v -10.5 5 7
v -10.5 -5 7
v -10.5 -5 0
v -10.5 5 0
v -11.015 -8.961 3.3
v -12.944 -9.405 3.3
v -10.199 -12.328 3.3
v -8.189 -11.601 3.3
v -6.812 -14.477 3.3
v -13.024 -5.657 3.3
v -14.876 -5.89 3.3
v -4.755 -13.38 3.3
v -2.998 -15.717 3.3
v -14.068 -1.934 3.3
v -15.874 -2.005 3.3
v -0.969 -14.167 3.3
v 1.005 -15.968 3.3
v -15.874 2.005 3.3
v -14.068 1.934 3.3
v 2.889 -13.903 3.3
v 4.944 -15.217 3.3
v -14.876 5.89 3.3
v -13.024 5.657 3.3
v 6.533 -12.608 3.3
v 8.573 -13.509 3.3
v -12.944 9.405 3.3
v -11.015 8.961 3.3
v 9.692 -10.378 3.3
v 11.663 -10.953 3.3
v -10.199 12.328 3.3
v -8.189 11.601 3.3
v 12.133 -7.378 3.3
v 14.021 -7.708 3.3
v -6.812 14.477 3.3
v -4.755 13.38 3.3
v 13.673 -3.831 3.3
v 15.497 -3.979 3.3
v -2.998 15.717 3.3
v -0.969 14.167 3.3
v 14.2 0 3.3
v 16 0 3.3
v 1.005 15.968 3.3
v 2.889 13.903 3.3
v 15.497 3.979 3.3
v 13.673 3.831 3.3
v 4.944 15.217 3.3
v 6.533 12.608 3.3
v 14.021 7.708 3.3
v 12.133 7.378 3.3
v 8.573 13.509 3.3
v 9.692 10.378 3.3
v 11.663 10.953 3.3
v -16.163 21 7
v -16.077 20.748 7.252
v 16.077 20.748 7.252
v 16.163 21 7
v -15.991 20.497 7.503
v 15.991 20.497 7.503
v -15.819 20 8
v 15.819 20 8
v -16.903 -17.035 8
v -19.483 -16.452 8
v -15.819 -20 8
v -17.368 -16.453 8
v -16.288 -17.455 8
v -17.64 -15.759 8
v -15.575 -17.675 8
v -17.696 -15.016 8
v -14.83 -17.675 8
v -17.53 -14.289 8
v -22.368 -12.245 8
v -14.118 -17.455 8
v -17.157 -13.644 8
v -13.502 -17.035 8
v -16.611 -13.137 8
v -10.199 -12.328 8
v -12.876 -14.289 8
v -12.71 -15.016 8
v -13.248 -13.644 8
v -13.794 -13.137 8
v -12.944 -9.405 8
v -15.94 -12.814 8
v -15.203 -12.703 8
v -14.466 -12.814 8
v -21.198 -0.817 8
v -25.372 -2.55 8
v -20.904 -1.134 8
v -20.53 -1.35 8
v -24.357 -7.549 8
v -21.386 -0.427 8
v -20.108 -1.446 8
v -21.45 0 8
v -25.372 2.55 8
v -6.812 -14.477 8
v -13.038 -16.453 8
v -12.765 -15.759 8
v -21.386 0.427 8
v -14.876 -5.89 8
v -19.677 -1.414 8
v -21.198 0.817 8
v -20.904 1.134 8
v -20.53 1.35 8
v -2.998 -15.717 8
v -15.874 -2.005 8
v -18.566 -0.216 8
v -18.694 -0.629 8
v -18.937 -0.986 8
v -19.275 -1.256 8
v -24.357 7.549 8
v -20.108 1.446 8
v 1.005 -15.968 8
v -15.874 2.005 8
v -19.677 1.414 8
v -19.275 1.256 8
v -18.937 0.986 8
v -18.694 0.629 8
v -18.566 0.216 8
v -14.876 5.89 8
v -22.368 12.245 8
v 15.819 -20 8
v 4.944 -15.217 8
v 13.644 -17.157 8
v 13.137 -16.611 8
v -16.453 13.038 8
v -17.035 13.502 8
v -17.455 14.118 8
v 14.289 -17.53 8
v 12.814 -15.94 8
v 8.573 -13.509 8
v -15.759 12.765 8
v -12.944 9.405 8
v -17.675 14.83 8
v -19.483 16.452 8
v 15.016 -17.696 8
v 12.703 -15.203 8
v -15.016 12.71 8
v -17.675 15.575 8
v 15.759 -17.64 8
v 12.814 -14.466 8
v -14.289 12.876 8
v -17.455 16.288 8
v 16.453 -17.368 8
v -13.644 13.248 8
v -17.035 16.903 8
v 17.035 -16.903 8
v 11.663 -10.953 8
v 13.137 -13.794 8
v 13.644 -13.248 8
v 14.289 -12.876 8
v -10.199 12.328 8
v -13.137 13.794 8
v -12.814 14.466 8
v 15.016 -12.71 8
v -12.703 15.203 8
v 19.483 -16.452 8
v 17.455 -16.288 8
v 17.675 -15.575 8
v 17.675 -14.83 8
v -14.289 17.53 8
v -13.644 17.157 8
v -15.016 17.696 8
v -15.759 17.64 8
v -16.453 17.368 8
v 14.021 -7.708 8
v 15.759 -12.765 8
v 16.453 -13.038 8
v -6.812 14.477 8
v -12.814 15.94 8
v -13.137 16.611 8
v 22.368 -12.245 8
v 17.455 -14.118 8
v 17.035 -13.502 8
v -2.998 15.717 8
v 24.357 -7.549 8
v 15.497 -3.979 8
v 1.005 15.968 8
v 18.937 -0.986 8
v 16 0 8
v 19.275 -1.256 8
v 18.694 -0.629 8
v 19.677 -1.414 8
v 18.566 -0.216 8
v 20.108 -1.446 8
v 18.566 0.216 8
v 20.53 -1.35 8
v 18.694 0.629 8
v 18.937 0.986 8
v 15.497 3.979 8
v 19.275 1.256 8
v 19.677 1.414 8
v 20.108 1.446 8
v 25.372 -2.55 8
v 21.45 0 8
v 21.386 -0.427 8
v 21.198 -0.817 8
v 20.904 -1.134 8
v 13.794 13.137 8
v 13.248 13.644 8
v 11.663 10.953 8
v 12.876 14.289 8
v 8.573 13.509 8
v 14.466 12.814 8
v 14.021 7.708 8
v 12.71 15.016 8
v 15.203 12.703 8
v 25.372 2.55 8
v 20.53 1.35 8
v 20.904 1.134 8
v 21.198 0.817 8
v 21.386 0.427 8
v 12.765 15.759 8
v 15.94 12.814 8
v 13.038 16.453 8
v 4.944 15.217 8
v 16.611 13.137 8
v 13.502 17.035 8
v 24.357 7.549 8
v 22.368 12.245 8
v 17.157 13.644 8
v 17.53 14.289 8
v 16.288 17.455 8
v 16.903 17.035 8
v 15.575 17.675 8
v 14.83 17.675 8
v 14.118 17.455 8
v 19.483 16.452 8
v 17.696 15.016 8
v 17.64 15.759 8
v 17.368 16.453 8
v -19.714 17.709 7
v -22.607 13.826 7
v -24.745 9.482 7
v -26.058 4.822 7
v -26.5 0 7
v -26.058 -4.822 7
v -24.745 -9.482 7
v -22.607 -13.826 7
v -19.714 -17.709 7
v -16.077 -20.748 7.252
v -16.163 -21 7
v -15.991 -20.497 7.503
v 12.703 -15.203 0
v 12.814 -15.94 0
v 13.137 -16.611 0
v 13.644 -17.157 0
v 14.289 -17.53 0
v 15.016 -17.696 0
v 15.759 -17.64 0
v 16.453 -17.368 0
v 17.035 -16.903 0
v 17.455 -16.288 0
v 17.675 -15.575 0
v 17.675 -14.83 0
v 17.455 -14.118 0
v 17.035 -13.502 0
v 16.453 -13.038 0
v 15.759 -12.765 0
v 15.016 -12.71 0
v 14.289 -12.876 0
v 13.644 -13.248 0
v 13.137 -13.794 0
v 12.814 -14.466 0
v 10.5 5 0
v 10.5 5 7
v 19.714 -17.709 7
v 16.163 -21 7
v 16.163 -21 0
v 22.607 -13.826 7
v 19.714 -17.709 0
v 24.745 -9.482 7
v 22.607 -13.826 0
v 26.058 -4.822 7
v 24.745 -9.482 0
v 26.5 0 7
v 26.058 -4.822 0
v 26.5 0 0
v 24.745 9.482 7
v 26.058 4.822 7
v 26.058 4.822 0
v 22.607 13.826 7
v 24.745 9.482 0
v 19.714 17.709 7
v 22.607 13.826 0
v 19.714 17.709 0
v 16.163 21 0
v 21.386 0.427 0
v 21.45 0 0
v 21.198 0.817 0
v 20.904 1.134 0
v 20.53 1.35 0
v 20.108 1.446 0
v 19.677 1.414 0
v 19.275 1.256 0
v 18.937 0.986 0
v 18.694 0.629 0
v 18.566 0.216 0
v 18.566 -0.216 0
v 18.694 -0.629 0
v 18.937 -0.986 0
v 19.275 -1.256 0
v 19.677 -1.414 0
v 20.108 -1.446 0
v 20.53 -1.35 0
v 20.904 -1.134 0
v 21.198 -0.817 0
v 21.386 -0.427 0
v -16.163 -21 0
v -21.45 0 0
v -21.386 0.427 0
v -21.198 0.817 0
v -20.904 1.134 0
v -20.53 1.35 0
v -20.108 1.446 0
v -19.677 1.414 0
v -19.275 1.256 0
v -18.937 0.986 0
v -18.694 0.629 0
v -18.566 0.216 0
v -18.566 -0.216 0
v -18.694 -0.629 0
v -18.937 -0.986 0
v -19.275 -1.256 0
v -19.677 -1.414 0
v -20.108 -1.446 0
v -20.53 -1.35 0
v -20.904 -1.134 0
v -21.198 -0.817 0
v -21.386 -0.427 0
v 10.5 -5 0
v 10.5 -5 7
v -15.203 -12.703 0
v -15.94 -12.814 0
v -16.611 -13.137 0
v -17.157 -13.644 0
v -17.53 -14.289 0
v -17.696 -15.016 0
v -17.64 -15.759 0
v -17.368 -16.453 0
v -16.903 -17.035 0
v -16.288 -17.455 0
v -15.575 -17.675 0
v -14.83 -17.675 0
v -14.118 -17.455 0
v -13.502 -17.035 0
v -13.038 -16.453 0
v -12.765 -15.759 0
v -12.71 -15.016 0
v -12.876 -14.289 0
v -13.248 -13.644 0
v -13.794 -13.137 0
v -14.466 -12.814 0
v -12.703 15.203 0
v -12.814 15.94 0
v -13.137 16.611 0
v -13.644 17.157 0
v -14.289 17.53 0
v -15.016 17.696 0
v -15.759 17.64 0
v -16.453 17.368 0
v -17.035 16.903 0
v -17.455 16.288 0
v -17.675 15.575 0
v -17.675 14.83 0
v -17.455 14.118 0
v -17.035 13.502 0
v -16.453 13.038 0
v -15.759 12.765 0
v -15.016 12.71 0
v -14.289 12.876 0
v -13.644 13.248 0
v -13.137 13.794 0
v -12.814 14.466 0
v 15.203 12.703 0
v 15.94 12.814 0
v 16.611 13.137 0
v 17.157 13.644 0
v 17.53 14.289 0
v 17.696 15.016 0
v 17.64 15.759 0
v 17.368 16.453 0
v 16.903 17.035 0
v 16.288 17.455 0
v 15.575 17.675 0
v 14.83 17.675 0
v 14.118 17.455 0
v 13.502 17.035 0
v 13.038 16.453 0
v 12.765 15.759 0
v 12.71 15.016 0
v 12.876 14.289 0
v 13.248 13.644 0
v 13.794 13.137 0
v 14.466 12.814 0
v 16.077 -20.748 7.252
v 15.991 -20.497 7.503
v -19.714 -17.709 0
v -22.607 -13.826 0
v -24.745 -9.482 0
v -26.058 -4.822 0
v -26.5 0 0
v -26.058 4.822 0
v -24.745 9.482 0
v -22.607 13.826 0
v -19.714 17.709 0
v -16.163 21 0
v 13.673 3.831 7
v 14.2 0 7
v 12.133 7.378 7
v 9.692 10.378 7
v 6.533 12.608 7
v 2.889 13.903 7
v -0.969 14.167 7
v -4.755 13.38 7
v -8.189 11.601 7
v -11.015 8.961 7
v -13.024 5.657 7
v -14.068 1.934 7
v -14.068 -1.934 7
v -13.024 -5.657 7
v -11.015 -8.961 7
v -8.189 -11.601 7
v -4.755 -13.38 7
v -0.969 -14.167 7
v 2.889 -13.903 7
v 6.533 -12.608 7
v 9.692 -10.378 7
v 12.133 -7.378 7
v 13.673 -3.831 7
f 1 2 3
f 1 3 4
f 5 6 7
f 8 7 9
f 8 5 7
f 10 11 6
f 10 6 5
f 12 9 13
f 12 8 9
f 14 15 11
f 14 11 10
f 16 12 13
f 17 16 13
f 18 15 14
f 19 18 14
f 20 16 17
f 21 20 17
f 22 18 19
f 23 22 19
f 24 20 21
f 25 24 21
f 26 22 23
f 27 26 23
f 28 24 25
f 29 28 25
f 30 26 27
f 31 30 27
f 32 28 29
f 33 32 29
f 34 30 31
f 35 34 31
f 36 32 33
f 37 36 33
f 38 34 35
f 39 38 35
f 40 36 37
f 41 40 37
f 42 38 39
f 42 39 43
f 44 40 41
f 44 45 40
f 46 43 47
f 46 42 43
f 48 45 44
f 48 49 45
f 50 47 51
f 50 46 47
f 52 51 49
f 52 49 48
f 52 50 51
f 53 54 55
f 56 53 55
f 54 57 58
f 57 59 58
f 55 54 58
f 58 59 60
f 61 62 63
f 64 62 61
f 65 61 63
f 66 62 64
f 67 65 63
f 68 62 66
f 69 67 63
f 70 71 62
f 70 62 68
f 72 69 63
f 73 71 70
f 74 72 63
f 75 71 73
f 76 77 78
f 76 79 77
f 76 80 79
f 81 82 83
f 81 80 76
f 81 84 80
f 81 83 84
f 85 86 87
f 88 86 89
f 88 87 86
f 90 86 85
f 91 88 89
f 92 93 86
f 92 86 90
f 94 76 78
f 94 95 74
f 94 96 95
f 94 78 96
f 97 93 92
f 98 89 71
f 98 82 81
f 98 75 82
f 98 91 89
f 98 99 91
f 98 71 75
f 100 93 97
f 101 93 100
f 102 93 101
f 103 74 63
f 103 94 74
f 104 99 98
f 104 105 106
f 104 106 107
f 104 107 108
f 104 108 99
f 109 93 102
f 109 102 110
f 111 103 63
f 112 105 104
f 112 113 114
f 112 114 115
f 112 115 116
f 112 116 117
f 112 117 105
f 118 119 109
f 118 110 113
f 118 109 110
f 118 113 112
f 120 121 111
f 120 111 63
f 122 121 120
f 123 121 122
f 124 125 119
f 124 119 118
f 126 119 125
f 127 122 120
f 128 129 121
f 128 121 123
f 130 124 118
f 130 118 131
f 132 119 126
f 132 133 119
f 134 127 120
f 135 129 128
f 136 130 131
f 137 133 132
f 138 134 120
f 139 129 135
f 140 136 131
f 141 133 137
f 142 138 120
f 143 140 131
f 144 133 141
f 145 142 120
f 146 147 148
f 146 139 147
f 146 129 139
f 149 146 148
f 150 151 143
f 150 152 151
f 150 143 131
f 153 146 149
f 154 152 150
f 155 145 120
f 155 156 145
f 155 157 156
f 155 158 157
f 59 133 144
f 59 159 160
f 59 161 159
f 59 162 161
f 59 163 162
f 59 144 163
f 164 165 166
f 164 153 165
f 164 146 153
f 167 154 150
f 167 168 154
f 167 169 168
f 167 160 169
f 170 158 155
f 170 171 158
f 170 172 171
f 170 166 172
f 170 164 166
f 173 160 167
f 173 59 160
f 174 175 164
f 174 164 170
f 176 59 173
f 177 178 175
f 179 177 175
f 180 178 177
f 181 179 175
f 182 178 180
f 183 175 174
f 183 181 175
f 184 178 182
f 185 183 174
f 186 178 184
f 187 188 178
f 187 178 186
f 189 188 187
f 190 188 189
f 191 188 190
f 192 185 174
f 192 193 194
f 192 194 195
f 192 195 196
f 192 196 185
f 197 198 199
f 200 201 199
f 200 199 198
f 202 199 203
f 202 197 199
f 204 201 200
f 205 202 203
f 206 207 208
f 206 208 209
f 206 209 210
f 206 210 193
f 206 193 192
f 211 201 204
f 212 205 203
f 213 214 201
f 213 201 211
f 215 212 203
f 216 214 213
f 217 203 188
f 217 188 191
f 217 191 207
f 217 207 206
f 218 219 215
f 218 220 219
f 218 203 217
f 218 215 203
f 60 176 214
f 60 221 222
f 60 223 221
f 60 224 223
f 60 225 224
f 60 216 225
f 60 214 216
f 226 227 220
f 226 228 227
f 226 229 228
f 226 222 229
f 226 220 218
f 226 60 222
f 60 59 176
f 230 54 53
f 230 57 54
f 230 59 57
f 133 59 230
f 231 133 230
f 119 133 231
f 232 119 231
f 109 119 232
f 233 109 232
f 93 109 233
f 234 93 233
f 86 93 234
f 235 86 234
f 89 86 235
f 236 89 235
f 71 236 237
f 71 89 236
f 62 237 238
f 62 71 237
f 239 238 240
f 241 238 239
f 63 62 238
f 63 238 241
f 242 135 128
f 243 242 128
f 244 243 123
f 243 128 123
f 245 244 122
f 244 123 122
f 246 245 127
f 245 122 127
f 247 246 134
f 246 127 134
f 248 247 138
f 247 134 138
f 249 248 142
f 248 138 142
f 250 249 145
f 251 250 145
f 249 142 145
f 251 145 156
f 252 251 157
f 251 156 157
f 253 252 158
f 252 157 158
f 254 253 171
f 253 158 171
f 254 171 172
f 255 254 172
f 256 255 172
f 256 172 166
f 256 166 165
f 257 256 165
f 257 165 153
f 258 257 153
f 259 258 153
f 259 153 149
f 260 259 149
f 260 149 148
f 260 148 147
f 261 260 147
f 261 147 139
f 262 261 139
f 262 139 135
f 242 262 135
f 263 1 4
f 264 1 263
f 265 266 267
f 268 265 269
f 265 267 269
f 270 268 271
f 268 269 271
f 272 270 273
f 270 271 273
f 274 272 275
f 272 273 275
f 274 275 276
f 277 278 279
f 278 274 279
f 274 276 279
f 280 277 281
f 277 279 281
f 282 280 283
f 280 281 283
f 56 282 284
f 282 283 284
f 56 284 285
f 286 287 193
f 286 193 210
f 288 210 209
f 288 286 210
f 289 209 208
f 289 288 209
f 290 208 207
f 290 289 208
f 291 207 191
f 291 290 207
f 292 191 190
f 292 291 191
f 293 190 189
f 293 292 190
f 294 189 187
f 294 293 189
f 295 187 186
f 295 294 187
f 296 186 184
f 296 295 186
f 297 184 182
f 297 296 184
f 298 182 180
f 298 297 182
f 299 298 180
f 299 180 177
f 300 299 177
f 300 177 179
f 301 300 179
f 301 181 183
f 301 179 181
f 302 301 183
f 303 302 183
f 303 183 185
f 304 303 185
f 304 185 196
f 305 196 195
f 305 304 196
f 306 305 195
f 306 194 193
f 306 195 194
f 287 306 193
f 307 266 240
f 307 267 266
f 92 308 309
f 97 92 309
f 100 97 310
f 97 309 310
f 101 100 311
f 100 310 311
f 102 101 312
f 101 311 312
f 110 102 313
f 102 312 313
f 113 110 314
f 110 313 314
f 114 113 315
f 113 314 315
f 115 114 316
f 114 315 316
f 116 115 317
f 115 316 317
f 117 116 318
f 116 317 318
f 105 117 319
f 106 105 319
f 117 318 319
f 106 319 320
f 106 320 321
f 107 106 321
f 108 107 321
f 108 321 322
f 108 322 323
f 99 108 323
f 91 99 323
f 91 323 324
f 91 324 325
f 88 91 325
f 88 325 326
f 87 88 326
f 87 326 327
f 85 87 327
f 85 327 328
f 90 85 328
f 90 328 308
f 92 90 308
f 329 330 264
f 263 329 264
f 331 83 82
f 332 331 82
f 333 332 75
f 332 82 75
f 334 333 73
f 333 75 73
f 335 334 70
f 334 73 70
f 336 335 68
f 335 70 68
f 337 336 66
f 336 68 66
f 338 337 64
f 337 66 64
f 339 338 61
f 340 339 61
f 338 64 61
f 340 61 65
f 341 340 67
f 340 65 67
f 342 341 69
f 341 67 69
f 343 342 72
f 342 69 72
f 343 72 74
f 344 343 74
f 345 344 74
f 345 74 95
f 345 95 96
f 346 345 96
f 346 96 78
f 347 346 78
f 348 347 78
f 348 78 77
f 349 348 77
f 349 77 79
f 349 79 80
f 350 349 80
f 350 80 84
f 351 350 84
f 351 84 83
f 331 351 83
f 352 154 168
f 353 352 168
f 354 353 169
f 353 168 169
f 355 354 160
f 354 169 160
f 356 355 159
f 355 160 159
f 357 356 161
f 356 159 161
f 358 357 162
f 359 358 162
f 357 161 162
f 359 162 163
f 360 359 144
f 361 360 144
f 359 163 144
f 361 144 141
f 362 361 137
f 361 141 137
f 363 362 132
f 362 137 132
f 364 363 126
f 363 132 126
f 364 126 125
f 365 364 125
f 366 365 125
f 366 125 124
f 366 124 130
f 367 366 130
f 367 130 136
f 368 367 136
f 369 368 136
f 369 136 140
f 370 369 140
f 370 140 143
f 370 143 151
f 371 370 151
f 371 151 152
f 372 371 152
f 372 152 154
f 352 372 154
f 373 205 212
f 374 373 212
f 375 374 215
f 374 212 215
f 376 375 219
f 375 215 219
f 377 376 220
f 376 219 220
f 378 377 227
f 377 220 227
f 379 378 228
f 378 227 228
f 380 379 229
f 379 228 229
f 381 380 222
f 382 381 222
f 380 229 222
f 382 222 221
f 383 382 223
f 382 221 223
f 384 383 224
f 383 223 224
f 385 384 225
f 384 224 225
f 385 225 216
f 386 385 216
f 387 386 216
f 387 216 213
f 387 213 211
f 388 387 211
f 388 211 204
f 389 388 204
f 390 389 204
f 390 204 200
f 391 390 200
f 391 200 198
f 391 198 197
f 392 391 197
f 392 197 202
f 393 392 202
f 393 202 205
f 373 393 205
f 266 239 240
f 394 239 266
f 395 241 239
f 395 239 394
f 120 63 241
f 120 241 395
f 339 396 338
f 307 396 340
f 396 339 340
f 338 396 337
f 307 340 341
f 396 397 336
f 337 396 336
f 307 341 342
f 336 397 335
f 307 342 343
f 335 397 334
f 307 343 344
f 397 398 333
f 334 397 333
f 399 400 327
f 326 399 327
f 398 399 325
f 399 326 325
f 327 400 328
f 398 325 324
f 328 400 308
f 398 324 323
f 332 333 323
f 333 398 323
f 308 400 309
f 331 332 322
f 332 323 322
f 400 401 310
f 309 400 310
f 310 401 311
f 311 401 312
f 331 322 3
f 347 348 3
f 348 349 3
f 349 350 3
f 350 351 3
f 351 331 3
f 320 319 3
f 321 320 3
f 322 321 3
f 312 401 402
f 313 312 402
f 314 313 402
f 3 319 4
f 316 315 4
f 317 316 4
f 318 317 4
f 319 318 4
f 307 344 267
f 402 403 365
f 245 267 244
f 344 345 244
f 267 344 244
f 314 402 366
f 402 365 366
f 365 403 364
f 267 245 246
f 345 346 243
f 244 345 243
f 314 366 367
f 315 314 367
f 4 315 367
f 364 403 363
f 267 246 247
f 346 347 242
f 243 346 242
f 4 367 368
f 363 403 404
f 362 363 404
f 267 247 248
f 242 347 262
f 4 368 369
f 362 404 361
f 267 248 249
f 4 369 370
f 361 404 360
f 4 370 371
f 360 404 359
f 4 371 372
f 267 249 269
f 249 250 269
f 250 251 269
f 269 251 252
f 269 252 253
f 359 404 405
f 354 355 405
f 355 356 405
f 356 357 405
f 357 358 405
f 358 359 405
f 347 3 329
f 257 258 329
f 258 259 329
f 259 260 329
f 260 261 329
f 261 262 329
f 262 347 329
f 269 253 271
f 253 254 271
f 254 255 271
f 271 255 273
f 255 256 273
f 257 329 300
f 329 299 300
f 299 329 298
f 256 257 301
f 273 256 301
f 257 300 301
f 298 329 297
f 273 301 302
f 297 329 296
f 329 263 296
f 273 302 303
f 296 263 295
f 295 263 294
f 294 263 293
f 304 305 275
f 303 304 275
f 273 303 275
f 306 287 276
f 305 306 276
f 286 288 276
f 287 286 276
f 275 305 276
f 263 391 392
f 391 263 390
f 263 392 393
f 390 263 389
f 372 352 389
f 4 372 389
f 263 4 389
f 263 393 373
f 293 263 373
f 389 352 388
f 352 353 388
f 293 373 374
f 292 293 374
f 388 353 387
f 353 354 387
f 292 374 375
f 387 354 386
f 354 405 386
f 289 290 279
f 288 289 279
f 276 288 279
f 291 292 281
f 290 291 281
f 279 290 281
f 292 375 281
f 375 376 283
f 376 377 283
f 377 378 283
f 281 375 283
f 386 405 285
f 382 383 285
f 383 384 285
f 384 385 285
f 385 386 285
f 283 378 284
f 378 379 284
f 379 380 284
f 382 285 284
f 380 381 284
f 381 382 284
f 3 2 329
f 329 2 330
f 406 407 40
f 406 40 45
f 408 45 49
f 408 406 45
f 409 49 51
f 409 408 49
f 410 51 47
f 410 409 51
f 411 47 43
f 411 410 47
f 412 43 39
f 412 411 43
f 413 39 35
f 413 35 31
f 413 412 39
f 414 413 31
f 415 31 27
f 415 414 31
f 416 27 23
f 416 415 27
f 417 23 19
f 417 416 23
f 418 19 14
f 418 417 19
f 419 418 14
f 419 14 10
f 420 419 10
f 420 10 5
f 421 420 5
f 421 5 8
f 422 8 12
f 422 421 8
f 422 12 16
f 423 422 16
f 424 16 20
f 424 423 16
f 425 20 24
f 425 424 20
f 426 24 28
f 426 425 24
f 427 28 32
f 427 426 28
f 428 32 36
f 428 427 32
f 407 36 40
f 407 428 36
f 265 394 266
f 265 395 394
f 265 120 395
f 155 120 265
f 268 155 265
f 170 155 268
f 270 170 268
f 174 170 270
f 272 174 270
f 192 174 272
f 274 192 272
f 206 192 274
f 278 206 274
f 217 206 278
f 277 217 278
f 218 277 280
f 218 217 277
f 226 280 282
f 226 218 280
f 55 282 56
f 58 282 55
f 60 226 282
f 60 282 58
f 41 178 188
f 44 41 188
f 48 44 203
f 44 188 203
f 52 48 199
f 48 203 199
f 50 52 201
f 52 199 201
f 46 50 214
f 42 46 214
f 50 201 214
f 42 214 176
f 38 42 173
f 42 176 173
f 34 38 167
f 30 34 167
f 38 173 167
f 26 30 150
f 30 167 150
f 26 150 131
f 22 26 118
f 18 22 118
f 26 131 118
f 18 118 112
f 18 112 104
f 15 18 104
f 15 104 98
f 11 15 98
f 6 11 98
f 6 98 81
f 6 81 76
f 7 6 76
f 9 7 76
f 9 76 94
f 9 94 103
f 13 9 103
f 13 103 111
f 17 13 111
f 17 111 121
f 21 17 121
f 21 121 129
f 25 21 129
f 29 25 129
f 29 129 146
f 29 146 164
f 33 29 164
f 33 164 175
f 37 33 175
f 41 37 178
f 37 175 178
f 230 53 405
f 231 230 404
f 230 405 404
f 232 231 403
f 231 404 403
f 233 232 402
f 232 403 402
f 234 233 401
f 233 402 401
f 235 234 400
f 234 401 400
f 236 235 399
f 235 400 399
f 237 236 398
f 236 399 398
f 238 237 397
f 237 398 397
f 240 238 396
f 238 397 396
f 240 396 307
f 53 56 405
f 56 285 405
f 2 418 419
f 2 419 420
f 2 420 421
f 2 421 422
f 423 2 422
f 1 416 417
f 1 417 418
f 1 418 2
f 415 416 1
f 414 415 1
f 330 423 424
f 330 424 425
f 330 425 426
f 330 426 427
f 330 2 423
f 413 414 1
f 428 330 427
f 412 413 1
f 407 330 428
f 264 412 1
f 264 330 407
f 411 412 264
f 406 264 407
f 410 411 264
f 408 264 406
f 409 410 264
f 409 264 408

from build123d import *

# Parameters (mm, degrees)
SKETCH_1_R               = 26.5
EXTRUDE_1_DEPTH          = 8
SKETCH_2_R               = 16
CUT_EXTRUDE_1_DEPTH      = 1
SKETCH_3_R               = 16
SKETCH_3_R_2             = 14.2
CUT_EXTRUDE_2_DEPTH      = 3.7
SKETCH_4_W               = 21
SKETCH_4_H               = 10
CUT_EXTRUDE_3_DEPTH      = 8
SKETCH_5_R               = 2.5
CUT_EXTRUDE_4_DEPTH      = 9
PATTERN_CIRCULAR_1_COUNT = 4
CHAMFER_1_SIZE           = 1
SKETCH_6_W               = 30
SKETCH_6_H               = 30
M3_5X0_61_D              = 2.9
CHAMFER_2_SIZE           = 1


with BuildPart() as part:
    # Эскиз1 → Бобышка-Вытянуть1 (new body)
    with BuildSketch(Plane.XY):
        Circle(SKETCH_1_R)
    extrude(amount=EXTRUDE_1_DEPTH)

    # Эскиз2 → Вырез-Вытянуть1 (cut)
    with BuildSketch(Plane.XY.offset(8)):
        Circle(SKETCH_2_R)
    extrude(amount=-CUT_EXTRUDE_1_DEPTH, mode=Mode.SUBTRACT)

    # Эскиз3 → Вырез-Вытянуть2 (cut)
    with BuildSketch(Plane.XY.offset(7)):
        Circle(SKETCH_3_R)
        Circle(SKETCH_3_R_2, mode=Mode.SUBTRACT)
    extrude(amount=-CUT_EXTRUDE_2_DEPTH, mode=Mode.SUBTRACT)

    # Эскиз4 → Вырез-Вытянуть3 (cut, through all)
    with BuildSketch(Plane.XY.offset(7)):
        Rectangle(SKETCH_4_W, SKETCH_4_H)
    extrude(amount=-CUT_EXTRUDE_3_DEPTH, mode=Mode.SUBTRACT)

    # Эскиз5 → Вырез-Вытянуть4 (cut, through all)
    with BuildSketch(Plane.XY.offset(8)):
        with Locations((-15.202795796, 15.202795796)):
            Circle(SKETCH_5_R)
    cut_extrude_4 = extrude(amount=-CUT_EXTRUDE_4_DEPTH, mode=Mode.SUBTRACT)

    # Круговой массив1: Вырез-Вытянуть4 ×4 about axis
    pattern_circular_1_axis = Axis((0, 0, 0), (0, 0, 1))
    for i in range(1, PATTERN_CIRCULAR_1_COUNT):
        add(cut_extrude_4.rotate(pattern_circular_1_axis, i * 360 / PATTERN_CIRCULAR_1_COUNT), mode=Mode.SUBTRACT)

    # Фаска1
    chamfer_1_edges = [part.edges().sort_by_distance(p)[0] for p in [
        (-26.5, 0, 8),
    ]]
    chamfer(chamfer_1_edges, length=CHAMFER_1_SIZE)

    # Эскиз6 → Вырез-Повернуть1 (revolve, cut)
    with BuildSketch(Plane.XY):
        with Locations((15, 36)):
            Rectangle(SKETCH_6_W, SKETCH_6_H)
    cut_revolve_1 = revolve(axis=Axis((0, 0, 0), (0, 1, 0)), mode=Mode.SUBTRACT)

    # Зеркальное отражение1: Вырез-Повернуть1 across plane
    add(cut_revolve_1.mirror(Plane.ZX), mode=Mode.SUBTRACT)

    # Отверстие обработанное метчиком M3.5x0.61 (through all)
    with Locations(Plane(origin=(-20, 0, 8), x_dir=(1, 0, 0), z_dir=(0, 0, 1))):
        with Locations((0, 0)):
            m3_5x0_61 = Hole(M3_5X0_61_D / 2)

    # Зеркальное отражение2: Отверстие обработанное метчиком M3.5x0.61 across plane
    add(m3_5x0_61.mirror(Plane(origin=(0, 0, 0), x_dir=(0, 0, 1), z_dir=(1, 0, 0))), mode=Mode.SUBTRACT)

    # Фаска2
    chamfer_2_edges = [part.edges().sort_by_distance(p)[0] for p in [
        (0, -21, 8),
        (0, 21, 8),
    ]]
    chamfer(chamfer_2_edges, length=CHAMFER_2_SIZE)


solid = part.part
